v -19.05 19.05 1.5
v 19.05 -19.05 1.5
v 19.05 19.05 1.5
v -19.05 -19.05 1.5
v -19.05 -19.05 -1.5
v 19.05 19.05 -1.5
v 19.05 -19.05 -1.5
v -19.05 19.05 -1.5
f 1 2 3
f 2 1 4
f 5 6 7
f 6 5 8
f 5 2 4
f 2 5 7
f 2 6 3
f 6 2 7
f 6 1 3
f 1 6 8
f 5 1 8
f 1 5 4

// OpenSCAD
// file: ../lib/TOGUnitTable-v1.scad
// TOGUnitTable-v1.0.0 - Library for handling 'complex amounts' in the form of [multiplier, unit name], e.g. [1.5, "inch"]
// 
// Versions:
// v1.0.0:
// - Created it.
// 
// Naming convention:
// Doing 'OO without classes', here.
// Fully qualified name = class or package name + "__" + member name
// Class or package name may itself be namespaced, and class names may double as package names.
// Here, tog_unittable names both a class and a package.

// Demo unit table uses 'micrometer' as the base unit
// in order to keep multipliers as integers as much as possible.
tog_unittable__demo_unit_table = [
	["um",    [    1   ,   "um"], "micrometer" ],
	["mm",    [ 1000   ,   "um"], "millimeter" ],
	["inch",  [25400   ,   "um"], "inch"       ],
	["u",     [    1/16, "inch"], "model unit" ], // As used by TGx9 et al
	["atom",  [    8   ,    "u"], "model atom" ],
	["chunk", [    3   , "atom"], "model chunk"],
];

function tog_unittable__list__filter(list, predicate) = [
	for( item=list ) if( predicate(item) ) item
];
function tog_unittable__list__first(list, on_error) =
	len(list) > 0 ? list[0] : on_error();

function tog_unittable__unit_value_ca(unit_table, unit_name) =
	tog_unittable__list__first(
		tog_unittable__list__filter(unit_table, function (entry) entry[0] == unit_name),
		function () assert(false, str("Did not find entry for unit '", unit_name, "' in unit table")))[1];

function tog_unittable__ca__is_valid( ca ) =
	is_list(ca) && len(ca) == 2;

// Break down 'amount' until it is in a base unit (one which is defined in terms of itself)
function tog_unittable__simplify_ca(unit_table, amount) =
	assert( tog_unittable__ca__is_valid(amount), str(amount, " is not a valid Complex Amount (should be [numeric_value, \"unit_name\"])") )
	let( unit_value_ca = tog_unittable__unit_value_ca(unit_table, amount[1]) )
	unit_value_ca[1] == amount[1] ? amount :
		tog_unittable__simplify_ca(unit_table, [amount[0] * unit_value_ca[0], unit_value_ca[1]]);

function tog_unittable__divide_ca(unit_table, numerator, denominator) =
	let(
		numerator_base_ca   = tog_unittable__simplify_ca(unit_table, numerator),
		denominator_base_ca = tog_unittable__simplify_ca(unit_table, denominator)
	)
	assert(numerator_base_ca[1] == denominator_base_ca[1], str("Different base units found for ", numerator[1], " and ", denominator[1]))
	numerator_base_ca[0] / denominator_base_ca[0];	

assert(tog_unittable__divide_ca(tog_unittable__demo_unit_table, [1,   "mm"], [  1, "mm"]) ==     1   );
assert(tog_unittable__divide_ca(tog_unittable__demo_unit_table, [1,   "mm"], [  1, "um"]) ==  1000   );
assert(tog_unittable__divide_ca(tog_unittable__demo_unit_table, [1, "inch"], [  1, "um"]) == 25400   );
assert(tog_unittable__divide_ca(tog_unittable__demo_unit_table, [1, "inch"], [  1, "mm"]) ==    25.4 );
assert(tog_unittable__divide_ca(tog_unittable__demo_unit_table, [1, "inch"], [254, "um"]) ==   100   );
assert(tog_unittable__divide_ca(tog_unittable__demo_unit_table, [1,    "u"], [  1, "um"]) ==  1587.5 );
// main file
include <../lib/TOGUnitTable-v1.scad>

$tog_unittable = tog_unittable__demo_unit_table;

cube([
	tog_unittable__divide_ca($tog_unittable, [1.5, "inch"], [1, "mm"]),
	tog_unittable__divide_ca($tog_unittable, [1.5, "inch"], [1, "mm"]),
	tog_unittable__divide_ca($tog_unittable, [3  ,   "mm"], [1, "mm"]),
], center=true);
